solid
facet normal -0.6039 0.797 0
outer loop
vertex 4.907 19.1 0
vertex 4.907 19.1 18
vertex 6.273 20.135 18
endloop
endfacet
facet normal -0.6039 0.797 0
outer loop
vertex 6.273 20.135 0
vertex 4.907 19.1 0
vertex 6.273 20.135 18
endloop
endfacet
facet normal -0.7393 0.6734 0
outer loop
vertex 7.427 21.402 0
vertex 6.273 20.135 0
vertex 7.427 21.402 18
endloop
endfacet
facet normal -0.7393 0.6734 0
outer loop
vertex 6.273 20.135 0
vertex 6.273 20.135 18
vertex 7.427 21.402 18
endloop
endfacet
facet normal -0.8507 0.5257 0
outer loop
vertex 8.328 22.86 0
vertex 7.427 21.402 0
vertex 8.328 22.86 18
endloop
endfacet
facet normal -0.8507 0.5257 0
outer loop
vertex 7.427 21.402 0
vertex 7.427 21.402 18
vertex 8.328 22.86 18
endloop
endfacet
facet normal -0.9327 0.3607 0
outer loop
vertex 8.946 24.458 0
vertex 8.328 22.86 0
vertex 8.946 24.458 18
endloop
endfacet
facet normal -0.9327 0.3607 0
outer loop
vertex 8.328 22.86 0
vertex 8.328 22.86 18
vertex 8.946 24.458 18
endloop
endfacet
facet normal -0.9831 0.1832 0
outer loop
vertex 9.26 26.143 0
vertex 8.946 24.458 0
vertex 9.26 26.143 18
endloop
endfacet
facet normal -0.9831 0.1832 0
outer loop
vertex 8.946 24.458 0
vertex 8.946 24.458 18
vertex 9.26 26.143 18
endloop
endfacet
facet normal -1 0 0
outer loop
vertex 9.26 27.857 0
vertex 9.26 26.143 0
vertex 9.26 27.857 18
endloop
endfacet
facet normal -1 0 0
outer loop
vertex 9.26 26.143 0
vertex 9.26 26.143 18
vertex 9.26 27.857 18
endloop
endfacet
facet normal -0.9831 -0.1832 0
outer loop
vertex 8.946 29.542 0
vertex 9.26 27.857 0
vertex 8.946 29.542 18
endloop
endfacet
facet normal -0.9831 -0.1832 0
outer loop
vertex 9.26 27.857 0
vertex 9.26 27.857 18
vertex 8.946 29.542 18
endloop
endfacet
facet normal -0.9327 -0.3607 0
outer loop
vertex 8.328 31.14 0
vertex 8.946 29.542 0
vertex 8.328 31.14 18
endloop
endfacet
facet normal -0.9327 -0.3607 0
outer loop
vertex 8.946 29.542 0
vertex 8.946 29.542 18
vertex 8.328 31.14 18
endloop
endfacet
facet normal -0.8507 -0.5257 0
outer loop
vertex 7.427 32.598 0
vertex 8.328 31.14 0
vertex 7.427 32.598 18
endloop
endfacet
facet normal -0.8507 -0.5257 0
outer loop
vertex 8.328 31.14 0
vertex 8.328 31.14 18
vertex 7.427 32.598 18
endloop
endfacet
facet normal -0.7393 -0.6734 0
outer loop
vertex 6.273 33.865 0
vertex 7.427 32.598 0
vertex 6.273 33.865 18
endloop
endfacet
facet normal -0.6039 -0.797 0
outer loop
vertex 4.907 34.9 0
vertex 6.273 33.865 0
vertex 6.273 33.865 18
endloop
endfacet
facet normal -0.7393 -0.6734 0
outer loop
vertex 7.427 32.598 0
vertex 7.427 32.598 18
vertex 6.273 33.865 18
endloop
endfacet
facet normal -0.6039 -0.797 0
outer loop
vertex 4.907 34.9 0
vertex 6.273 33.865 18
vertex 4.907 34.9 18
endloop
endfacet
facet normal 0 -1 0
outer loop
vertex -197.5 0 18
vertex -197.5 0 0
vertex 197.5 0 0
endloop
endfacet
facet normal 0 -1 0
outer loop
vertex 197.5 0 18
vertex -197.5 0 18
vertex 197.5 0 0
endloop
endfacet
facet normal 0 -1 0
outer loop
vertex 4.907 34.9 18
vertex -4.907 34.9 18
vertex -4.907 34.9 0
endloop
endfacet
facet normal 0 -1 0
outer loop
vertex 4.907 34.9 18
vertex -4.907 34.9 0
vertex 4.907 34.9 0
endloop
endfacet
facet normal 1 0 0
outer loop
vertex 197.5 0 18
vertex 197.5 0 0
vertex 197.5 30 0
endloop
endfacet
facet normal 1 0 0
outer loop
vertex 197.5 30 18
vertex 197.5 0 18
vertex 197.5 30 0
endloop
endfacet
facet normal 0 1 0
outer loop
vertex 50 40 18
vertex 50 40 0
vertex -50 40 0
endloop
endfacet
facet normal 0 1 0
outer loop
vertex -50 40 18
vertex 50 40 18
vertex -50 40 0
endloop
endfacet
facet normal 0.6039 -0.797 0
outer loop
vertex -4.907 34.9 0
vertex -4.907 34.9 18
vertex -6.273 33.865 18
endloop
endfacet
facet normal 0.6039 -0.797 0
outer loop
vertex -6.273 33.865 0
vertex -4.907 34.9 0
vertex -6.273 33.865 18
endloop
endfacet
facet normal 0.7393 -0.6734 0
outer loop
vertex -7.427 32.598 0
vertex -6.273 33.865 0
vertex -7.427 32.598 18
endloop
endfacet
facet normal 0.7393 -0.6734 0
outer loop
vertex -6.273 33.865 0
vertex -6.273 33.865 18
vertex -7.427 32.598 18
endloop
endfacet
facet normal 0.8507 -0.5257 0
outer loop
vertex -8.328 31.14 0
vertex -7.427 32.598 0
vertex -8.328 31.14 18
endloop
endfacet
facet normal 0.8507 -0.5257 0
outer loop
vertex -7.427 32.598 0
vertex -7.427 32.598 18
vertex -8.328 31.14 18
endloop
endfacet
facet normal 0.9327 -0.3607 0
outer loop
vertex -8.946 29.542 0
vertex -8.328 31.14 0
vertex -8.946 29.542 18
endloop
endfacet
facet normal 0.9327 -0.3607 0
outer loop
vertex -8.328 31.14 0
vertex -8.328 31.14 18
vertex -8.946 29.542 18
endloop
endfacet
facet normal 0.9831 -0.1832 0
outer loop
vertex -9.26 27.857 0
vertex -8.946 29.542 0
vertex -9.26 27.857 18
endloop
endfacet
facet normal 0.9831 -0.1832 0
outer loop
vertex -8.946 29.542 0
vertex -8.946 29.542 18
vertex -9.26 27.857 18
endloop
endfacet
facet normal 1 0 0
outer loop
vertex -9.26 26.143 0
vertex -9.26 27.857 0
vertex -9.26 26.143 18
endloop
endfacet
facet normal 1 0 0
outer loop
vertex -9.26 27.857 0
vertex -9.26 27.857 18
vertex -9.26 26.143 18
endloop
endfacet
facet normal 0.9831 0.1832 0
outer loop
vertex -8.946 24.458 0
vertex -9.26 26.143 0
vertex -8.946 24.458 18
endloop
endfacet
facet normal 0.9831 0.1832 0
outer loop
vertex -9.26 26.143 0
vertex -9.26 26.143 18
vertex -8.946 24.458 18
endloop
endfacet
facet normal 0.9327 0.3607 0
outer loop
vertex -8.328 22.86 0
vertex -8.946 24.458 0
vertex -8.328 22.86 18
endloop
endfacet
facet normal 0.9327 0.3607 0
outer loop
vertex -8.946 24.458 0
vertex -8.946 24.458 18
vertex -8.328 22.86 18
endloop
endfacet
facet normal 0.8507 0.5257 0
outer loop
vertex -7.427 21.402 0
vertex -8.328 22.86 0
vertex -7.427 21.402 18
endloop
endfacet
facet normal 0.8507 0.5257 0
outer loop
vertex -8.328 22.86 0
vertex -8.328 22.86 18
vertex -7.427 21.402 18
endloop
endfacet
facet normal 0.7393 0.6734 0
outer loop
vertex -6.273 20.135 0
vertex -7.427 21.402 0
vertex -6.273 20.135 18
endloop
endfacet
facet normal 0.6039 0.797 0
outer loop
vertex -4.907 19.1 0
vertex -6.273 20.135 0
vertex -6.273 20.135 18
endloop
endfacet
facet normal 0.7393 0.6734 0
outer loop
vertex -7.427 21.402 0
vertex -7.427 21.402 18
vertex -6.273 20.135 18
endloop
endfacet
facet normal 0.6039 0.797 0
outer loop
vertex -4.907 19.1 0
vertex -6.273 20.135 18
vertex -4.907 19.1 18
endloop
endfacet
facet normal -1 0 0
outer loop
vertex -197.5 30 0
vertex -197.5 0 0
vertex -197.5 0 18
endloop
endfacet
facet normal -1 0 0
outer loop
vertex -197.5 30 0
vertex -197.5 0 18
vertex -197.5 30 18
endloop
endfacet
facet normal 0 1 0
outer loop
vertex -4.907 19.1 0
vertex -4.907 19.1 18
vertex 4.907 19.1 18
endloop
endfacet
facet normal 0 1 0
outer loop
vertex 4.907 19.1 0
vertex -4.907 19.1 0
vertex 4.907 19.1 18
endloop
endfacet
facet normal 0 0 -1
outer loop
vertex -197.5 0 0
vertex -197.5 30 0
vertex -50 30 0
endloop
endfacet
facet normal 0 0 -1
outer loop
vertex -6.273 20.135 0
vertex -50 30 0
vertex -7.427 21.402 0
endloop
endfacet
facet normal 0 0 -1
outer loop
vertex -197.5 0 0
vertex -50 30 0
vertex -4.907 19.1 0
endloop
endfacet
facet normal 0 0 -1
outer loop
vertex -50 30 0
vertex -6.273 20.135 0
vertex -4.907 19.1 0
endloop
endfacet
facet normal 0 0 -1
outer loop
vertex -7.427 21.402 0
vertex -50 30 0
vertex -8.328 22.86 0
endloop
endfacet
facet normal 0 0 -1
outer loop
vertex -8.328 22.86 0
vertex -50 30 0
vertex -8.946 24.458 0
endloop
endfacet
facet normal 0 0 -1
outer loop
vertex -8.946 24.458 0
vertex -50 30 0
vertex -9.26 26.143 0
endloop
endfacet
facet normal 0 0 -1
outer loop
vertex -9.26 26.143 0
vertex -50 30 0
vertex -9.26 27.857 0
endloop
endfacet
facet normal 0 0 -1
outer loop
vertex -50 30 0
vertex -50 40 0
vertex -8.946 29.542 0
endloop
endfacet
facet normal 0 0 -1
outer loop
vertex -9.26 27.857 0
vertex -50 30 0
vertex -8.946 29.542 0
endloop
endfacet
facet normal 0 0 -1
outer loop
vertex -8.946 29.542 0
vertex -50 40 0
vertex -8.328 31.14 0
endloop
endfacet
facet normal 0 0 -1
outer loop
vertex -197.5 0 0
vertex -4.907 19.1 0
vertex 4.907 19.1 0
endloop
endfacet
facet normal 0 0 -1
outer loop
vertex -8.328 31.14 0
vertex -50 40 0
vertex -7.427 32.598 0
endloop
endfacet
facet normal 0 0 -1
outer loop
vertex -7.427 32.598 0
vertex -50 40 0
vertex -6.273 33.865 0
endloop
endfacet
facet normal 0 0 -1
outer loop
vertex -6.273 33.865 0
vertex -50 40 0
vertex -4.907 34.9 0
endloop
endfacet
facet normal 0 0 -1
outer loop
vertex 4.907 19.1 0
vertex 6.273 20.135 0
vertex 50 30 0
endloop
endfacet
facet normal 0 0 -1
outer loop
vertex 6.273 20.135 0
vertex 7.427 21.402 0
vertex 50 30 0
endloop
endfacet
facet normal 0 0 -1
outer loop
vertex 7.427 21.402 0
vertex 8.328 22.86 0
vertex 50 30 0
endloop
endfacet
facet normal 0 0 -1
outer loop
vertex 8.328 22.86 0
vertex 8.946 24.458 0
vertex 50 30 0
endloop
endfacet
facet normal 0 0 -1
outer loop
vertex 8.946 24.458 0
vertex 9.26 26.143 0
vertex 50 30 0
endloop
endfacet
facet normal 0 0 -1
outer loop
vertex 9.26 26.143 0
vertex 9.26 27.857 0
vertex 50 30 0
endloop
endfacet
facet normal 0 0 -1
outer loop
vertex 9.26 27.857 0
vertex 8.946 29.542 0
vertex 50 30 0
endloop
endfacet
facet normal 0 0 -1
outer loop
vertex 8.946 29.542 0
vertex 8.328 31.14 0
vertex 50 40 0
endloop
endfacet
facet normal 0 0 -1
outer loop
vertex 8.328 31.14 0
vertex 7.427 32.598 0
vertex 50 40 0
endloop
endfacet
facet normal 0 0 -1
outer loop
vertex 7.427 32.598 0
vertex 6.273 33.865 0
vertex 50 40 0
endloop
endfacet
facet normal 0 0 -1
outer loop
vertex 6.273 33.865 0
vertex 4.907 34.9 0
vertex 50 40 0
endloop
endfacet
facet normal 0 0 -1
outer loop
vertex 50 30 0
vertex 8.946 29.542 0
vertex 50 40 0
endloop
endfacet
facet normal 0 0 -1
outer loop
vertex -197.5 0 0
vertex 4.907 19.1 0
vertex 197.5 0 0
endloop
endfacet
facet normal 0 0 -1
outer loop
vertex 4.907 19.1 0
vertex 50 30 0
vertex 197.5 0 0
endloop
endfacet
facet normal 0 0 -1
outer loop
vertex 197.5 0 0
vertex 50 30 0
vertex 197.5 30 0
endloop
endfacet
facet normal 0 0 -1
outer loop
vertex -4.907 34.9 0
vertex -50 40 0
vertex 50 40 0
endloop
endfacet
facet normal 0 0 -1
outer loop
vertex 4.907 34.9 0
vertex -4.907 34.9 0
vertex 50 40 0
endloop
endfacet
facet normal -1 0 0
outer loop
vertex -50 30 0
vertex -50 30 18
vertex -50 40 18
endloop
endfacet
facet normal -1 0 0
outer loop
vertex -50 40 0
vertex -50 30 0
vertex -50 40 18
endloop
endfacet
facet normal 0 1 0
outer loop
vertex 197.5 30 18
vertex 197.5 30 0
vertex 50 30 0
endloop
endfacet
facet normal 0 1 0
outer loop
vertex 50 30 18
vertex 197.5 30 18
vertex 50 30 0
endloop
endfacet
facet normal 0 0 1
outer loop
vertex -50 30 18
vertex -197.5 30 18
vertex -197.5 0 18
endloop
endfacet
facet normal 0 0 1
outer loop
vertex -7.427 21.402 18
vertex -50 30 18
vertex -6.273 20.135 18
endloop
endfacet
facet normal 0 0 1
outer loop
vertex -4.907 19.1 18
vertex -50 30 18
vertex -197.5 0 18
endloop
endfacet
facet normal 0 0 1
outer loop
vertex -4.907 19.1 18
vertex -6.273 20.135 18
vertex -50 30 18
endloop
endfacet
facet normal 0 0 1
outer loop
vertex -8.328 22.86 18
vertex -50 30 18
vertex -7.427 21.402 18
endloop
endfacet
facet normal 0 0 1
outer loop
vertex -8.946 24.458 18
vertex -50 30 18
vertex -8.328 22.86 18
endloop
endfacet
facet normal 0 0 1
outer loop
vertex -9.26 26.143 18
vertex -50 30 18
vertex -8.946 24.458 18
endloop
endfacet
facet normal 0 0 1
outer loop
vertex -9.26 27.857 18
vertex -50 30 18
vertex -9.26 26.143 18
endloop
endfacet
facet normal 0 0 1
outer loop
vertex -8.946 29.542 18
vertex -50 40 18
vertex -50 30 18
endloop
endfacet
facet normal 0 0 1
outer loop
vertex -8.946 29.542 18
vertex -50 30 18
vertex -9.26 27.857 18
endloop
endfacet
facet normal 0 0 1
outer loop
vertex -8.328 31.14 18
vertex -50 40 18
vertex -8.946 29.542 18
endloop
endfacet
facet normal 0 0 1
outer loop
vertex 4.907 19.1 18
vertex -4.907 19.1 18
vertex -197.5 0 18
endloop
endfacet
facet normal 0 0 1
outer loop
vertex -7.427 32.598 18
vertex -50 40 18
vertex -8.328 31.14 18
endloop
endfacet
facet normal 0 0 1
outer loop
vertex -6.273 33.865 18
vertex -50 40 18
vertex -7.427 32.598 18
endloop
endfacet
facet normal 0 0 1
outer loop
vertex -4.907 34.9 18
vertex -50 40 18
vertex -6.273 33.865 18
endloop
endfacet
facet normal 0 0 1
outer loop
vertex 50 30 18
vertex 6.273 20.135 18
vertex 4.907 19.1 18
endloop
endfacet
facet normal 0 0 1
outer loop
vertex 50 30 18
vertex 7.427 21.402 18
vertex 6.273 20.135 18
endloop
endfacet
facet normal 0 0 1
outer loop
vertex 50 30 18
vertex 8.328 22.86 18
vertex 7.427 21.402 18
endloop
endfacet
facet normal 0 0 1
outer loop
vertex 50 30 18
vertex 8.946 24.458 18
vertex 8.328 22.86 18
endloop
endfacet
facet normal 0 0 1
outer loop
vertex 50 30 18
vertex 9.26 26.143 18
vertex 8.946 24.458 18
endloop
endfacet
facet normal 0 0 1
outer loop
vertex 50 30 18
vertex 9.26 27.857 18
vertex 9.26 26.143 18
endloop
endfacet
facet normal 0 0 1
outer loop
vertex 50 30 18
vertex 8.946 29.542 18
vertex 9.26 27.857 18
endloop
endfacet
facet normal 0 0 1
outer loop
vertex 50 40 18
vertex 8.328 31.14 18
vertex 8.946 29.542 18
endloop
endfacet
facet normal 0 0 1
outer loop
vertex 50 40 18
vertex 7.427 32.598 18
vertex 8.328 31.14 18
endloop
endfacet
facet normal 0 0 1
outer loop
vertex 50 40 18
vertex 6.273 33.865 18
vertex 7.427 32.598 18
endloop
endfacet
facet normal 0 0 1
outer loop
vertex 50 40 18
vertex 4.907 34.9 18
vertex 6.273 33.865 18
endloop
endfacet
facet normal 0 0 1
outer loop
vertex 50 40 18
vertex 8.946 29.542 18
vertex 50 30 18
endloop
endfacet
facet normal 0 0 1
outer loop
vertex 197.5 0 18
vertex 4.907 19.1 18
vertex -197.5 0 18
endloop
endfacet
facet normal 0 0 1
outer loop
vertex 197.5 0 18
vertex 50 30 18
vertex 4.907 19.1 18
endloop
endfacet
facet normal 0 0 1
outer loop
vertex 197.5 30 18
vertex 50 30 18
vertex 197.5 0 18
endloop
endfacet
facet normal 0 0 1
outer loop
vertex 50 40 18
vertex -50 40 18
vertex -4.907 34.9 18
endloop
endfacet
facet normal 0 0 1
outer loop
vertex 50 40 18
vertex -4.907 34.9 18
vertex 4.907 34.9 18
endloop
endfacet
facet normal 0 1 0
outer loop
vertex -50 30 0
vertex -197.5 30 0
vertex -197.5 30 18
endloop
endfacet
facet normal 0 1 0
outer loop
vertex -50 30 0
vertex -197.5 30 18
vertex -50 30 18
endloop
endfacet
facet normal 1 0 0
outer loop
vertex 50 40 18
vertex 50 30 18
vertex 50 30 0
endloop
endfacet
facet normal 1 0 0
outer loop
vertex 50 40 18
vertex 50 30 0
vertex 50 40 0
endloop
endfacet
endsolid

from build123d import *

# Parameters (mm, degrees)
PAD_DEPTH    = 18
POCKET_DEPTH = 18


with BuildPart() as part:
    # Sketch → Pad (new body)
    with BuildSketch(Plane.XY):
        Polygon((0, 0), (-197.5, 0), (-197.5, 30), (-50, 30), (-50, 40), (0, 40), align=None)
    pad = extrude(amount=PAD_DEPTH)

    # Mirrored: Pad across Sketch V_Axis
    add(pad.mirror(Plane(origin=(0, 0, 0), x_dir=(0, 0, 1), z_dir=(1, 0, 0))))

    # Sketch001 (on DatumPlane) → Pocket (cut)
    with BuildSketch(Plane.XY.offset(18)):
        with BuildLine():
            ThreePointArc((-4.907138, 34.9), (-9.3, 27), (-4.907138, 19.1))
            Line((-4.907138, 19.1), (4.907138, 19.1))
            ThreePointArc((4.907138, 19.1), (9.3, 27), (4.907138, 34.9))
            Line((-4.907138, 34.9), (4.907138, 34.9))
        make_face()
    extrude(amount=-POCKET_DEPTH, mode=Mode.SUBTRACT)


solid = part.part
